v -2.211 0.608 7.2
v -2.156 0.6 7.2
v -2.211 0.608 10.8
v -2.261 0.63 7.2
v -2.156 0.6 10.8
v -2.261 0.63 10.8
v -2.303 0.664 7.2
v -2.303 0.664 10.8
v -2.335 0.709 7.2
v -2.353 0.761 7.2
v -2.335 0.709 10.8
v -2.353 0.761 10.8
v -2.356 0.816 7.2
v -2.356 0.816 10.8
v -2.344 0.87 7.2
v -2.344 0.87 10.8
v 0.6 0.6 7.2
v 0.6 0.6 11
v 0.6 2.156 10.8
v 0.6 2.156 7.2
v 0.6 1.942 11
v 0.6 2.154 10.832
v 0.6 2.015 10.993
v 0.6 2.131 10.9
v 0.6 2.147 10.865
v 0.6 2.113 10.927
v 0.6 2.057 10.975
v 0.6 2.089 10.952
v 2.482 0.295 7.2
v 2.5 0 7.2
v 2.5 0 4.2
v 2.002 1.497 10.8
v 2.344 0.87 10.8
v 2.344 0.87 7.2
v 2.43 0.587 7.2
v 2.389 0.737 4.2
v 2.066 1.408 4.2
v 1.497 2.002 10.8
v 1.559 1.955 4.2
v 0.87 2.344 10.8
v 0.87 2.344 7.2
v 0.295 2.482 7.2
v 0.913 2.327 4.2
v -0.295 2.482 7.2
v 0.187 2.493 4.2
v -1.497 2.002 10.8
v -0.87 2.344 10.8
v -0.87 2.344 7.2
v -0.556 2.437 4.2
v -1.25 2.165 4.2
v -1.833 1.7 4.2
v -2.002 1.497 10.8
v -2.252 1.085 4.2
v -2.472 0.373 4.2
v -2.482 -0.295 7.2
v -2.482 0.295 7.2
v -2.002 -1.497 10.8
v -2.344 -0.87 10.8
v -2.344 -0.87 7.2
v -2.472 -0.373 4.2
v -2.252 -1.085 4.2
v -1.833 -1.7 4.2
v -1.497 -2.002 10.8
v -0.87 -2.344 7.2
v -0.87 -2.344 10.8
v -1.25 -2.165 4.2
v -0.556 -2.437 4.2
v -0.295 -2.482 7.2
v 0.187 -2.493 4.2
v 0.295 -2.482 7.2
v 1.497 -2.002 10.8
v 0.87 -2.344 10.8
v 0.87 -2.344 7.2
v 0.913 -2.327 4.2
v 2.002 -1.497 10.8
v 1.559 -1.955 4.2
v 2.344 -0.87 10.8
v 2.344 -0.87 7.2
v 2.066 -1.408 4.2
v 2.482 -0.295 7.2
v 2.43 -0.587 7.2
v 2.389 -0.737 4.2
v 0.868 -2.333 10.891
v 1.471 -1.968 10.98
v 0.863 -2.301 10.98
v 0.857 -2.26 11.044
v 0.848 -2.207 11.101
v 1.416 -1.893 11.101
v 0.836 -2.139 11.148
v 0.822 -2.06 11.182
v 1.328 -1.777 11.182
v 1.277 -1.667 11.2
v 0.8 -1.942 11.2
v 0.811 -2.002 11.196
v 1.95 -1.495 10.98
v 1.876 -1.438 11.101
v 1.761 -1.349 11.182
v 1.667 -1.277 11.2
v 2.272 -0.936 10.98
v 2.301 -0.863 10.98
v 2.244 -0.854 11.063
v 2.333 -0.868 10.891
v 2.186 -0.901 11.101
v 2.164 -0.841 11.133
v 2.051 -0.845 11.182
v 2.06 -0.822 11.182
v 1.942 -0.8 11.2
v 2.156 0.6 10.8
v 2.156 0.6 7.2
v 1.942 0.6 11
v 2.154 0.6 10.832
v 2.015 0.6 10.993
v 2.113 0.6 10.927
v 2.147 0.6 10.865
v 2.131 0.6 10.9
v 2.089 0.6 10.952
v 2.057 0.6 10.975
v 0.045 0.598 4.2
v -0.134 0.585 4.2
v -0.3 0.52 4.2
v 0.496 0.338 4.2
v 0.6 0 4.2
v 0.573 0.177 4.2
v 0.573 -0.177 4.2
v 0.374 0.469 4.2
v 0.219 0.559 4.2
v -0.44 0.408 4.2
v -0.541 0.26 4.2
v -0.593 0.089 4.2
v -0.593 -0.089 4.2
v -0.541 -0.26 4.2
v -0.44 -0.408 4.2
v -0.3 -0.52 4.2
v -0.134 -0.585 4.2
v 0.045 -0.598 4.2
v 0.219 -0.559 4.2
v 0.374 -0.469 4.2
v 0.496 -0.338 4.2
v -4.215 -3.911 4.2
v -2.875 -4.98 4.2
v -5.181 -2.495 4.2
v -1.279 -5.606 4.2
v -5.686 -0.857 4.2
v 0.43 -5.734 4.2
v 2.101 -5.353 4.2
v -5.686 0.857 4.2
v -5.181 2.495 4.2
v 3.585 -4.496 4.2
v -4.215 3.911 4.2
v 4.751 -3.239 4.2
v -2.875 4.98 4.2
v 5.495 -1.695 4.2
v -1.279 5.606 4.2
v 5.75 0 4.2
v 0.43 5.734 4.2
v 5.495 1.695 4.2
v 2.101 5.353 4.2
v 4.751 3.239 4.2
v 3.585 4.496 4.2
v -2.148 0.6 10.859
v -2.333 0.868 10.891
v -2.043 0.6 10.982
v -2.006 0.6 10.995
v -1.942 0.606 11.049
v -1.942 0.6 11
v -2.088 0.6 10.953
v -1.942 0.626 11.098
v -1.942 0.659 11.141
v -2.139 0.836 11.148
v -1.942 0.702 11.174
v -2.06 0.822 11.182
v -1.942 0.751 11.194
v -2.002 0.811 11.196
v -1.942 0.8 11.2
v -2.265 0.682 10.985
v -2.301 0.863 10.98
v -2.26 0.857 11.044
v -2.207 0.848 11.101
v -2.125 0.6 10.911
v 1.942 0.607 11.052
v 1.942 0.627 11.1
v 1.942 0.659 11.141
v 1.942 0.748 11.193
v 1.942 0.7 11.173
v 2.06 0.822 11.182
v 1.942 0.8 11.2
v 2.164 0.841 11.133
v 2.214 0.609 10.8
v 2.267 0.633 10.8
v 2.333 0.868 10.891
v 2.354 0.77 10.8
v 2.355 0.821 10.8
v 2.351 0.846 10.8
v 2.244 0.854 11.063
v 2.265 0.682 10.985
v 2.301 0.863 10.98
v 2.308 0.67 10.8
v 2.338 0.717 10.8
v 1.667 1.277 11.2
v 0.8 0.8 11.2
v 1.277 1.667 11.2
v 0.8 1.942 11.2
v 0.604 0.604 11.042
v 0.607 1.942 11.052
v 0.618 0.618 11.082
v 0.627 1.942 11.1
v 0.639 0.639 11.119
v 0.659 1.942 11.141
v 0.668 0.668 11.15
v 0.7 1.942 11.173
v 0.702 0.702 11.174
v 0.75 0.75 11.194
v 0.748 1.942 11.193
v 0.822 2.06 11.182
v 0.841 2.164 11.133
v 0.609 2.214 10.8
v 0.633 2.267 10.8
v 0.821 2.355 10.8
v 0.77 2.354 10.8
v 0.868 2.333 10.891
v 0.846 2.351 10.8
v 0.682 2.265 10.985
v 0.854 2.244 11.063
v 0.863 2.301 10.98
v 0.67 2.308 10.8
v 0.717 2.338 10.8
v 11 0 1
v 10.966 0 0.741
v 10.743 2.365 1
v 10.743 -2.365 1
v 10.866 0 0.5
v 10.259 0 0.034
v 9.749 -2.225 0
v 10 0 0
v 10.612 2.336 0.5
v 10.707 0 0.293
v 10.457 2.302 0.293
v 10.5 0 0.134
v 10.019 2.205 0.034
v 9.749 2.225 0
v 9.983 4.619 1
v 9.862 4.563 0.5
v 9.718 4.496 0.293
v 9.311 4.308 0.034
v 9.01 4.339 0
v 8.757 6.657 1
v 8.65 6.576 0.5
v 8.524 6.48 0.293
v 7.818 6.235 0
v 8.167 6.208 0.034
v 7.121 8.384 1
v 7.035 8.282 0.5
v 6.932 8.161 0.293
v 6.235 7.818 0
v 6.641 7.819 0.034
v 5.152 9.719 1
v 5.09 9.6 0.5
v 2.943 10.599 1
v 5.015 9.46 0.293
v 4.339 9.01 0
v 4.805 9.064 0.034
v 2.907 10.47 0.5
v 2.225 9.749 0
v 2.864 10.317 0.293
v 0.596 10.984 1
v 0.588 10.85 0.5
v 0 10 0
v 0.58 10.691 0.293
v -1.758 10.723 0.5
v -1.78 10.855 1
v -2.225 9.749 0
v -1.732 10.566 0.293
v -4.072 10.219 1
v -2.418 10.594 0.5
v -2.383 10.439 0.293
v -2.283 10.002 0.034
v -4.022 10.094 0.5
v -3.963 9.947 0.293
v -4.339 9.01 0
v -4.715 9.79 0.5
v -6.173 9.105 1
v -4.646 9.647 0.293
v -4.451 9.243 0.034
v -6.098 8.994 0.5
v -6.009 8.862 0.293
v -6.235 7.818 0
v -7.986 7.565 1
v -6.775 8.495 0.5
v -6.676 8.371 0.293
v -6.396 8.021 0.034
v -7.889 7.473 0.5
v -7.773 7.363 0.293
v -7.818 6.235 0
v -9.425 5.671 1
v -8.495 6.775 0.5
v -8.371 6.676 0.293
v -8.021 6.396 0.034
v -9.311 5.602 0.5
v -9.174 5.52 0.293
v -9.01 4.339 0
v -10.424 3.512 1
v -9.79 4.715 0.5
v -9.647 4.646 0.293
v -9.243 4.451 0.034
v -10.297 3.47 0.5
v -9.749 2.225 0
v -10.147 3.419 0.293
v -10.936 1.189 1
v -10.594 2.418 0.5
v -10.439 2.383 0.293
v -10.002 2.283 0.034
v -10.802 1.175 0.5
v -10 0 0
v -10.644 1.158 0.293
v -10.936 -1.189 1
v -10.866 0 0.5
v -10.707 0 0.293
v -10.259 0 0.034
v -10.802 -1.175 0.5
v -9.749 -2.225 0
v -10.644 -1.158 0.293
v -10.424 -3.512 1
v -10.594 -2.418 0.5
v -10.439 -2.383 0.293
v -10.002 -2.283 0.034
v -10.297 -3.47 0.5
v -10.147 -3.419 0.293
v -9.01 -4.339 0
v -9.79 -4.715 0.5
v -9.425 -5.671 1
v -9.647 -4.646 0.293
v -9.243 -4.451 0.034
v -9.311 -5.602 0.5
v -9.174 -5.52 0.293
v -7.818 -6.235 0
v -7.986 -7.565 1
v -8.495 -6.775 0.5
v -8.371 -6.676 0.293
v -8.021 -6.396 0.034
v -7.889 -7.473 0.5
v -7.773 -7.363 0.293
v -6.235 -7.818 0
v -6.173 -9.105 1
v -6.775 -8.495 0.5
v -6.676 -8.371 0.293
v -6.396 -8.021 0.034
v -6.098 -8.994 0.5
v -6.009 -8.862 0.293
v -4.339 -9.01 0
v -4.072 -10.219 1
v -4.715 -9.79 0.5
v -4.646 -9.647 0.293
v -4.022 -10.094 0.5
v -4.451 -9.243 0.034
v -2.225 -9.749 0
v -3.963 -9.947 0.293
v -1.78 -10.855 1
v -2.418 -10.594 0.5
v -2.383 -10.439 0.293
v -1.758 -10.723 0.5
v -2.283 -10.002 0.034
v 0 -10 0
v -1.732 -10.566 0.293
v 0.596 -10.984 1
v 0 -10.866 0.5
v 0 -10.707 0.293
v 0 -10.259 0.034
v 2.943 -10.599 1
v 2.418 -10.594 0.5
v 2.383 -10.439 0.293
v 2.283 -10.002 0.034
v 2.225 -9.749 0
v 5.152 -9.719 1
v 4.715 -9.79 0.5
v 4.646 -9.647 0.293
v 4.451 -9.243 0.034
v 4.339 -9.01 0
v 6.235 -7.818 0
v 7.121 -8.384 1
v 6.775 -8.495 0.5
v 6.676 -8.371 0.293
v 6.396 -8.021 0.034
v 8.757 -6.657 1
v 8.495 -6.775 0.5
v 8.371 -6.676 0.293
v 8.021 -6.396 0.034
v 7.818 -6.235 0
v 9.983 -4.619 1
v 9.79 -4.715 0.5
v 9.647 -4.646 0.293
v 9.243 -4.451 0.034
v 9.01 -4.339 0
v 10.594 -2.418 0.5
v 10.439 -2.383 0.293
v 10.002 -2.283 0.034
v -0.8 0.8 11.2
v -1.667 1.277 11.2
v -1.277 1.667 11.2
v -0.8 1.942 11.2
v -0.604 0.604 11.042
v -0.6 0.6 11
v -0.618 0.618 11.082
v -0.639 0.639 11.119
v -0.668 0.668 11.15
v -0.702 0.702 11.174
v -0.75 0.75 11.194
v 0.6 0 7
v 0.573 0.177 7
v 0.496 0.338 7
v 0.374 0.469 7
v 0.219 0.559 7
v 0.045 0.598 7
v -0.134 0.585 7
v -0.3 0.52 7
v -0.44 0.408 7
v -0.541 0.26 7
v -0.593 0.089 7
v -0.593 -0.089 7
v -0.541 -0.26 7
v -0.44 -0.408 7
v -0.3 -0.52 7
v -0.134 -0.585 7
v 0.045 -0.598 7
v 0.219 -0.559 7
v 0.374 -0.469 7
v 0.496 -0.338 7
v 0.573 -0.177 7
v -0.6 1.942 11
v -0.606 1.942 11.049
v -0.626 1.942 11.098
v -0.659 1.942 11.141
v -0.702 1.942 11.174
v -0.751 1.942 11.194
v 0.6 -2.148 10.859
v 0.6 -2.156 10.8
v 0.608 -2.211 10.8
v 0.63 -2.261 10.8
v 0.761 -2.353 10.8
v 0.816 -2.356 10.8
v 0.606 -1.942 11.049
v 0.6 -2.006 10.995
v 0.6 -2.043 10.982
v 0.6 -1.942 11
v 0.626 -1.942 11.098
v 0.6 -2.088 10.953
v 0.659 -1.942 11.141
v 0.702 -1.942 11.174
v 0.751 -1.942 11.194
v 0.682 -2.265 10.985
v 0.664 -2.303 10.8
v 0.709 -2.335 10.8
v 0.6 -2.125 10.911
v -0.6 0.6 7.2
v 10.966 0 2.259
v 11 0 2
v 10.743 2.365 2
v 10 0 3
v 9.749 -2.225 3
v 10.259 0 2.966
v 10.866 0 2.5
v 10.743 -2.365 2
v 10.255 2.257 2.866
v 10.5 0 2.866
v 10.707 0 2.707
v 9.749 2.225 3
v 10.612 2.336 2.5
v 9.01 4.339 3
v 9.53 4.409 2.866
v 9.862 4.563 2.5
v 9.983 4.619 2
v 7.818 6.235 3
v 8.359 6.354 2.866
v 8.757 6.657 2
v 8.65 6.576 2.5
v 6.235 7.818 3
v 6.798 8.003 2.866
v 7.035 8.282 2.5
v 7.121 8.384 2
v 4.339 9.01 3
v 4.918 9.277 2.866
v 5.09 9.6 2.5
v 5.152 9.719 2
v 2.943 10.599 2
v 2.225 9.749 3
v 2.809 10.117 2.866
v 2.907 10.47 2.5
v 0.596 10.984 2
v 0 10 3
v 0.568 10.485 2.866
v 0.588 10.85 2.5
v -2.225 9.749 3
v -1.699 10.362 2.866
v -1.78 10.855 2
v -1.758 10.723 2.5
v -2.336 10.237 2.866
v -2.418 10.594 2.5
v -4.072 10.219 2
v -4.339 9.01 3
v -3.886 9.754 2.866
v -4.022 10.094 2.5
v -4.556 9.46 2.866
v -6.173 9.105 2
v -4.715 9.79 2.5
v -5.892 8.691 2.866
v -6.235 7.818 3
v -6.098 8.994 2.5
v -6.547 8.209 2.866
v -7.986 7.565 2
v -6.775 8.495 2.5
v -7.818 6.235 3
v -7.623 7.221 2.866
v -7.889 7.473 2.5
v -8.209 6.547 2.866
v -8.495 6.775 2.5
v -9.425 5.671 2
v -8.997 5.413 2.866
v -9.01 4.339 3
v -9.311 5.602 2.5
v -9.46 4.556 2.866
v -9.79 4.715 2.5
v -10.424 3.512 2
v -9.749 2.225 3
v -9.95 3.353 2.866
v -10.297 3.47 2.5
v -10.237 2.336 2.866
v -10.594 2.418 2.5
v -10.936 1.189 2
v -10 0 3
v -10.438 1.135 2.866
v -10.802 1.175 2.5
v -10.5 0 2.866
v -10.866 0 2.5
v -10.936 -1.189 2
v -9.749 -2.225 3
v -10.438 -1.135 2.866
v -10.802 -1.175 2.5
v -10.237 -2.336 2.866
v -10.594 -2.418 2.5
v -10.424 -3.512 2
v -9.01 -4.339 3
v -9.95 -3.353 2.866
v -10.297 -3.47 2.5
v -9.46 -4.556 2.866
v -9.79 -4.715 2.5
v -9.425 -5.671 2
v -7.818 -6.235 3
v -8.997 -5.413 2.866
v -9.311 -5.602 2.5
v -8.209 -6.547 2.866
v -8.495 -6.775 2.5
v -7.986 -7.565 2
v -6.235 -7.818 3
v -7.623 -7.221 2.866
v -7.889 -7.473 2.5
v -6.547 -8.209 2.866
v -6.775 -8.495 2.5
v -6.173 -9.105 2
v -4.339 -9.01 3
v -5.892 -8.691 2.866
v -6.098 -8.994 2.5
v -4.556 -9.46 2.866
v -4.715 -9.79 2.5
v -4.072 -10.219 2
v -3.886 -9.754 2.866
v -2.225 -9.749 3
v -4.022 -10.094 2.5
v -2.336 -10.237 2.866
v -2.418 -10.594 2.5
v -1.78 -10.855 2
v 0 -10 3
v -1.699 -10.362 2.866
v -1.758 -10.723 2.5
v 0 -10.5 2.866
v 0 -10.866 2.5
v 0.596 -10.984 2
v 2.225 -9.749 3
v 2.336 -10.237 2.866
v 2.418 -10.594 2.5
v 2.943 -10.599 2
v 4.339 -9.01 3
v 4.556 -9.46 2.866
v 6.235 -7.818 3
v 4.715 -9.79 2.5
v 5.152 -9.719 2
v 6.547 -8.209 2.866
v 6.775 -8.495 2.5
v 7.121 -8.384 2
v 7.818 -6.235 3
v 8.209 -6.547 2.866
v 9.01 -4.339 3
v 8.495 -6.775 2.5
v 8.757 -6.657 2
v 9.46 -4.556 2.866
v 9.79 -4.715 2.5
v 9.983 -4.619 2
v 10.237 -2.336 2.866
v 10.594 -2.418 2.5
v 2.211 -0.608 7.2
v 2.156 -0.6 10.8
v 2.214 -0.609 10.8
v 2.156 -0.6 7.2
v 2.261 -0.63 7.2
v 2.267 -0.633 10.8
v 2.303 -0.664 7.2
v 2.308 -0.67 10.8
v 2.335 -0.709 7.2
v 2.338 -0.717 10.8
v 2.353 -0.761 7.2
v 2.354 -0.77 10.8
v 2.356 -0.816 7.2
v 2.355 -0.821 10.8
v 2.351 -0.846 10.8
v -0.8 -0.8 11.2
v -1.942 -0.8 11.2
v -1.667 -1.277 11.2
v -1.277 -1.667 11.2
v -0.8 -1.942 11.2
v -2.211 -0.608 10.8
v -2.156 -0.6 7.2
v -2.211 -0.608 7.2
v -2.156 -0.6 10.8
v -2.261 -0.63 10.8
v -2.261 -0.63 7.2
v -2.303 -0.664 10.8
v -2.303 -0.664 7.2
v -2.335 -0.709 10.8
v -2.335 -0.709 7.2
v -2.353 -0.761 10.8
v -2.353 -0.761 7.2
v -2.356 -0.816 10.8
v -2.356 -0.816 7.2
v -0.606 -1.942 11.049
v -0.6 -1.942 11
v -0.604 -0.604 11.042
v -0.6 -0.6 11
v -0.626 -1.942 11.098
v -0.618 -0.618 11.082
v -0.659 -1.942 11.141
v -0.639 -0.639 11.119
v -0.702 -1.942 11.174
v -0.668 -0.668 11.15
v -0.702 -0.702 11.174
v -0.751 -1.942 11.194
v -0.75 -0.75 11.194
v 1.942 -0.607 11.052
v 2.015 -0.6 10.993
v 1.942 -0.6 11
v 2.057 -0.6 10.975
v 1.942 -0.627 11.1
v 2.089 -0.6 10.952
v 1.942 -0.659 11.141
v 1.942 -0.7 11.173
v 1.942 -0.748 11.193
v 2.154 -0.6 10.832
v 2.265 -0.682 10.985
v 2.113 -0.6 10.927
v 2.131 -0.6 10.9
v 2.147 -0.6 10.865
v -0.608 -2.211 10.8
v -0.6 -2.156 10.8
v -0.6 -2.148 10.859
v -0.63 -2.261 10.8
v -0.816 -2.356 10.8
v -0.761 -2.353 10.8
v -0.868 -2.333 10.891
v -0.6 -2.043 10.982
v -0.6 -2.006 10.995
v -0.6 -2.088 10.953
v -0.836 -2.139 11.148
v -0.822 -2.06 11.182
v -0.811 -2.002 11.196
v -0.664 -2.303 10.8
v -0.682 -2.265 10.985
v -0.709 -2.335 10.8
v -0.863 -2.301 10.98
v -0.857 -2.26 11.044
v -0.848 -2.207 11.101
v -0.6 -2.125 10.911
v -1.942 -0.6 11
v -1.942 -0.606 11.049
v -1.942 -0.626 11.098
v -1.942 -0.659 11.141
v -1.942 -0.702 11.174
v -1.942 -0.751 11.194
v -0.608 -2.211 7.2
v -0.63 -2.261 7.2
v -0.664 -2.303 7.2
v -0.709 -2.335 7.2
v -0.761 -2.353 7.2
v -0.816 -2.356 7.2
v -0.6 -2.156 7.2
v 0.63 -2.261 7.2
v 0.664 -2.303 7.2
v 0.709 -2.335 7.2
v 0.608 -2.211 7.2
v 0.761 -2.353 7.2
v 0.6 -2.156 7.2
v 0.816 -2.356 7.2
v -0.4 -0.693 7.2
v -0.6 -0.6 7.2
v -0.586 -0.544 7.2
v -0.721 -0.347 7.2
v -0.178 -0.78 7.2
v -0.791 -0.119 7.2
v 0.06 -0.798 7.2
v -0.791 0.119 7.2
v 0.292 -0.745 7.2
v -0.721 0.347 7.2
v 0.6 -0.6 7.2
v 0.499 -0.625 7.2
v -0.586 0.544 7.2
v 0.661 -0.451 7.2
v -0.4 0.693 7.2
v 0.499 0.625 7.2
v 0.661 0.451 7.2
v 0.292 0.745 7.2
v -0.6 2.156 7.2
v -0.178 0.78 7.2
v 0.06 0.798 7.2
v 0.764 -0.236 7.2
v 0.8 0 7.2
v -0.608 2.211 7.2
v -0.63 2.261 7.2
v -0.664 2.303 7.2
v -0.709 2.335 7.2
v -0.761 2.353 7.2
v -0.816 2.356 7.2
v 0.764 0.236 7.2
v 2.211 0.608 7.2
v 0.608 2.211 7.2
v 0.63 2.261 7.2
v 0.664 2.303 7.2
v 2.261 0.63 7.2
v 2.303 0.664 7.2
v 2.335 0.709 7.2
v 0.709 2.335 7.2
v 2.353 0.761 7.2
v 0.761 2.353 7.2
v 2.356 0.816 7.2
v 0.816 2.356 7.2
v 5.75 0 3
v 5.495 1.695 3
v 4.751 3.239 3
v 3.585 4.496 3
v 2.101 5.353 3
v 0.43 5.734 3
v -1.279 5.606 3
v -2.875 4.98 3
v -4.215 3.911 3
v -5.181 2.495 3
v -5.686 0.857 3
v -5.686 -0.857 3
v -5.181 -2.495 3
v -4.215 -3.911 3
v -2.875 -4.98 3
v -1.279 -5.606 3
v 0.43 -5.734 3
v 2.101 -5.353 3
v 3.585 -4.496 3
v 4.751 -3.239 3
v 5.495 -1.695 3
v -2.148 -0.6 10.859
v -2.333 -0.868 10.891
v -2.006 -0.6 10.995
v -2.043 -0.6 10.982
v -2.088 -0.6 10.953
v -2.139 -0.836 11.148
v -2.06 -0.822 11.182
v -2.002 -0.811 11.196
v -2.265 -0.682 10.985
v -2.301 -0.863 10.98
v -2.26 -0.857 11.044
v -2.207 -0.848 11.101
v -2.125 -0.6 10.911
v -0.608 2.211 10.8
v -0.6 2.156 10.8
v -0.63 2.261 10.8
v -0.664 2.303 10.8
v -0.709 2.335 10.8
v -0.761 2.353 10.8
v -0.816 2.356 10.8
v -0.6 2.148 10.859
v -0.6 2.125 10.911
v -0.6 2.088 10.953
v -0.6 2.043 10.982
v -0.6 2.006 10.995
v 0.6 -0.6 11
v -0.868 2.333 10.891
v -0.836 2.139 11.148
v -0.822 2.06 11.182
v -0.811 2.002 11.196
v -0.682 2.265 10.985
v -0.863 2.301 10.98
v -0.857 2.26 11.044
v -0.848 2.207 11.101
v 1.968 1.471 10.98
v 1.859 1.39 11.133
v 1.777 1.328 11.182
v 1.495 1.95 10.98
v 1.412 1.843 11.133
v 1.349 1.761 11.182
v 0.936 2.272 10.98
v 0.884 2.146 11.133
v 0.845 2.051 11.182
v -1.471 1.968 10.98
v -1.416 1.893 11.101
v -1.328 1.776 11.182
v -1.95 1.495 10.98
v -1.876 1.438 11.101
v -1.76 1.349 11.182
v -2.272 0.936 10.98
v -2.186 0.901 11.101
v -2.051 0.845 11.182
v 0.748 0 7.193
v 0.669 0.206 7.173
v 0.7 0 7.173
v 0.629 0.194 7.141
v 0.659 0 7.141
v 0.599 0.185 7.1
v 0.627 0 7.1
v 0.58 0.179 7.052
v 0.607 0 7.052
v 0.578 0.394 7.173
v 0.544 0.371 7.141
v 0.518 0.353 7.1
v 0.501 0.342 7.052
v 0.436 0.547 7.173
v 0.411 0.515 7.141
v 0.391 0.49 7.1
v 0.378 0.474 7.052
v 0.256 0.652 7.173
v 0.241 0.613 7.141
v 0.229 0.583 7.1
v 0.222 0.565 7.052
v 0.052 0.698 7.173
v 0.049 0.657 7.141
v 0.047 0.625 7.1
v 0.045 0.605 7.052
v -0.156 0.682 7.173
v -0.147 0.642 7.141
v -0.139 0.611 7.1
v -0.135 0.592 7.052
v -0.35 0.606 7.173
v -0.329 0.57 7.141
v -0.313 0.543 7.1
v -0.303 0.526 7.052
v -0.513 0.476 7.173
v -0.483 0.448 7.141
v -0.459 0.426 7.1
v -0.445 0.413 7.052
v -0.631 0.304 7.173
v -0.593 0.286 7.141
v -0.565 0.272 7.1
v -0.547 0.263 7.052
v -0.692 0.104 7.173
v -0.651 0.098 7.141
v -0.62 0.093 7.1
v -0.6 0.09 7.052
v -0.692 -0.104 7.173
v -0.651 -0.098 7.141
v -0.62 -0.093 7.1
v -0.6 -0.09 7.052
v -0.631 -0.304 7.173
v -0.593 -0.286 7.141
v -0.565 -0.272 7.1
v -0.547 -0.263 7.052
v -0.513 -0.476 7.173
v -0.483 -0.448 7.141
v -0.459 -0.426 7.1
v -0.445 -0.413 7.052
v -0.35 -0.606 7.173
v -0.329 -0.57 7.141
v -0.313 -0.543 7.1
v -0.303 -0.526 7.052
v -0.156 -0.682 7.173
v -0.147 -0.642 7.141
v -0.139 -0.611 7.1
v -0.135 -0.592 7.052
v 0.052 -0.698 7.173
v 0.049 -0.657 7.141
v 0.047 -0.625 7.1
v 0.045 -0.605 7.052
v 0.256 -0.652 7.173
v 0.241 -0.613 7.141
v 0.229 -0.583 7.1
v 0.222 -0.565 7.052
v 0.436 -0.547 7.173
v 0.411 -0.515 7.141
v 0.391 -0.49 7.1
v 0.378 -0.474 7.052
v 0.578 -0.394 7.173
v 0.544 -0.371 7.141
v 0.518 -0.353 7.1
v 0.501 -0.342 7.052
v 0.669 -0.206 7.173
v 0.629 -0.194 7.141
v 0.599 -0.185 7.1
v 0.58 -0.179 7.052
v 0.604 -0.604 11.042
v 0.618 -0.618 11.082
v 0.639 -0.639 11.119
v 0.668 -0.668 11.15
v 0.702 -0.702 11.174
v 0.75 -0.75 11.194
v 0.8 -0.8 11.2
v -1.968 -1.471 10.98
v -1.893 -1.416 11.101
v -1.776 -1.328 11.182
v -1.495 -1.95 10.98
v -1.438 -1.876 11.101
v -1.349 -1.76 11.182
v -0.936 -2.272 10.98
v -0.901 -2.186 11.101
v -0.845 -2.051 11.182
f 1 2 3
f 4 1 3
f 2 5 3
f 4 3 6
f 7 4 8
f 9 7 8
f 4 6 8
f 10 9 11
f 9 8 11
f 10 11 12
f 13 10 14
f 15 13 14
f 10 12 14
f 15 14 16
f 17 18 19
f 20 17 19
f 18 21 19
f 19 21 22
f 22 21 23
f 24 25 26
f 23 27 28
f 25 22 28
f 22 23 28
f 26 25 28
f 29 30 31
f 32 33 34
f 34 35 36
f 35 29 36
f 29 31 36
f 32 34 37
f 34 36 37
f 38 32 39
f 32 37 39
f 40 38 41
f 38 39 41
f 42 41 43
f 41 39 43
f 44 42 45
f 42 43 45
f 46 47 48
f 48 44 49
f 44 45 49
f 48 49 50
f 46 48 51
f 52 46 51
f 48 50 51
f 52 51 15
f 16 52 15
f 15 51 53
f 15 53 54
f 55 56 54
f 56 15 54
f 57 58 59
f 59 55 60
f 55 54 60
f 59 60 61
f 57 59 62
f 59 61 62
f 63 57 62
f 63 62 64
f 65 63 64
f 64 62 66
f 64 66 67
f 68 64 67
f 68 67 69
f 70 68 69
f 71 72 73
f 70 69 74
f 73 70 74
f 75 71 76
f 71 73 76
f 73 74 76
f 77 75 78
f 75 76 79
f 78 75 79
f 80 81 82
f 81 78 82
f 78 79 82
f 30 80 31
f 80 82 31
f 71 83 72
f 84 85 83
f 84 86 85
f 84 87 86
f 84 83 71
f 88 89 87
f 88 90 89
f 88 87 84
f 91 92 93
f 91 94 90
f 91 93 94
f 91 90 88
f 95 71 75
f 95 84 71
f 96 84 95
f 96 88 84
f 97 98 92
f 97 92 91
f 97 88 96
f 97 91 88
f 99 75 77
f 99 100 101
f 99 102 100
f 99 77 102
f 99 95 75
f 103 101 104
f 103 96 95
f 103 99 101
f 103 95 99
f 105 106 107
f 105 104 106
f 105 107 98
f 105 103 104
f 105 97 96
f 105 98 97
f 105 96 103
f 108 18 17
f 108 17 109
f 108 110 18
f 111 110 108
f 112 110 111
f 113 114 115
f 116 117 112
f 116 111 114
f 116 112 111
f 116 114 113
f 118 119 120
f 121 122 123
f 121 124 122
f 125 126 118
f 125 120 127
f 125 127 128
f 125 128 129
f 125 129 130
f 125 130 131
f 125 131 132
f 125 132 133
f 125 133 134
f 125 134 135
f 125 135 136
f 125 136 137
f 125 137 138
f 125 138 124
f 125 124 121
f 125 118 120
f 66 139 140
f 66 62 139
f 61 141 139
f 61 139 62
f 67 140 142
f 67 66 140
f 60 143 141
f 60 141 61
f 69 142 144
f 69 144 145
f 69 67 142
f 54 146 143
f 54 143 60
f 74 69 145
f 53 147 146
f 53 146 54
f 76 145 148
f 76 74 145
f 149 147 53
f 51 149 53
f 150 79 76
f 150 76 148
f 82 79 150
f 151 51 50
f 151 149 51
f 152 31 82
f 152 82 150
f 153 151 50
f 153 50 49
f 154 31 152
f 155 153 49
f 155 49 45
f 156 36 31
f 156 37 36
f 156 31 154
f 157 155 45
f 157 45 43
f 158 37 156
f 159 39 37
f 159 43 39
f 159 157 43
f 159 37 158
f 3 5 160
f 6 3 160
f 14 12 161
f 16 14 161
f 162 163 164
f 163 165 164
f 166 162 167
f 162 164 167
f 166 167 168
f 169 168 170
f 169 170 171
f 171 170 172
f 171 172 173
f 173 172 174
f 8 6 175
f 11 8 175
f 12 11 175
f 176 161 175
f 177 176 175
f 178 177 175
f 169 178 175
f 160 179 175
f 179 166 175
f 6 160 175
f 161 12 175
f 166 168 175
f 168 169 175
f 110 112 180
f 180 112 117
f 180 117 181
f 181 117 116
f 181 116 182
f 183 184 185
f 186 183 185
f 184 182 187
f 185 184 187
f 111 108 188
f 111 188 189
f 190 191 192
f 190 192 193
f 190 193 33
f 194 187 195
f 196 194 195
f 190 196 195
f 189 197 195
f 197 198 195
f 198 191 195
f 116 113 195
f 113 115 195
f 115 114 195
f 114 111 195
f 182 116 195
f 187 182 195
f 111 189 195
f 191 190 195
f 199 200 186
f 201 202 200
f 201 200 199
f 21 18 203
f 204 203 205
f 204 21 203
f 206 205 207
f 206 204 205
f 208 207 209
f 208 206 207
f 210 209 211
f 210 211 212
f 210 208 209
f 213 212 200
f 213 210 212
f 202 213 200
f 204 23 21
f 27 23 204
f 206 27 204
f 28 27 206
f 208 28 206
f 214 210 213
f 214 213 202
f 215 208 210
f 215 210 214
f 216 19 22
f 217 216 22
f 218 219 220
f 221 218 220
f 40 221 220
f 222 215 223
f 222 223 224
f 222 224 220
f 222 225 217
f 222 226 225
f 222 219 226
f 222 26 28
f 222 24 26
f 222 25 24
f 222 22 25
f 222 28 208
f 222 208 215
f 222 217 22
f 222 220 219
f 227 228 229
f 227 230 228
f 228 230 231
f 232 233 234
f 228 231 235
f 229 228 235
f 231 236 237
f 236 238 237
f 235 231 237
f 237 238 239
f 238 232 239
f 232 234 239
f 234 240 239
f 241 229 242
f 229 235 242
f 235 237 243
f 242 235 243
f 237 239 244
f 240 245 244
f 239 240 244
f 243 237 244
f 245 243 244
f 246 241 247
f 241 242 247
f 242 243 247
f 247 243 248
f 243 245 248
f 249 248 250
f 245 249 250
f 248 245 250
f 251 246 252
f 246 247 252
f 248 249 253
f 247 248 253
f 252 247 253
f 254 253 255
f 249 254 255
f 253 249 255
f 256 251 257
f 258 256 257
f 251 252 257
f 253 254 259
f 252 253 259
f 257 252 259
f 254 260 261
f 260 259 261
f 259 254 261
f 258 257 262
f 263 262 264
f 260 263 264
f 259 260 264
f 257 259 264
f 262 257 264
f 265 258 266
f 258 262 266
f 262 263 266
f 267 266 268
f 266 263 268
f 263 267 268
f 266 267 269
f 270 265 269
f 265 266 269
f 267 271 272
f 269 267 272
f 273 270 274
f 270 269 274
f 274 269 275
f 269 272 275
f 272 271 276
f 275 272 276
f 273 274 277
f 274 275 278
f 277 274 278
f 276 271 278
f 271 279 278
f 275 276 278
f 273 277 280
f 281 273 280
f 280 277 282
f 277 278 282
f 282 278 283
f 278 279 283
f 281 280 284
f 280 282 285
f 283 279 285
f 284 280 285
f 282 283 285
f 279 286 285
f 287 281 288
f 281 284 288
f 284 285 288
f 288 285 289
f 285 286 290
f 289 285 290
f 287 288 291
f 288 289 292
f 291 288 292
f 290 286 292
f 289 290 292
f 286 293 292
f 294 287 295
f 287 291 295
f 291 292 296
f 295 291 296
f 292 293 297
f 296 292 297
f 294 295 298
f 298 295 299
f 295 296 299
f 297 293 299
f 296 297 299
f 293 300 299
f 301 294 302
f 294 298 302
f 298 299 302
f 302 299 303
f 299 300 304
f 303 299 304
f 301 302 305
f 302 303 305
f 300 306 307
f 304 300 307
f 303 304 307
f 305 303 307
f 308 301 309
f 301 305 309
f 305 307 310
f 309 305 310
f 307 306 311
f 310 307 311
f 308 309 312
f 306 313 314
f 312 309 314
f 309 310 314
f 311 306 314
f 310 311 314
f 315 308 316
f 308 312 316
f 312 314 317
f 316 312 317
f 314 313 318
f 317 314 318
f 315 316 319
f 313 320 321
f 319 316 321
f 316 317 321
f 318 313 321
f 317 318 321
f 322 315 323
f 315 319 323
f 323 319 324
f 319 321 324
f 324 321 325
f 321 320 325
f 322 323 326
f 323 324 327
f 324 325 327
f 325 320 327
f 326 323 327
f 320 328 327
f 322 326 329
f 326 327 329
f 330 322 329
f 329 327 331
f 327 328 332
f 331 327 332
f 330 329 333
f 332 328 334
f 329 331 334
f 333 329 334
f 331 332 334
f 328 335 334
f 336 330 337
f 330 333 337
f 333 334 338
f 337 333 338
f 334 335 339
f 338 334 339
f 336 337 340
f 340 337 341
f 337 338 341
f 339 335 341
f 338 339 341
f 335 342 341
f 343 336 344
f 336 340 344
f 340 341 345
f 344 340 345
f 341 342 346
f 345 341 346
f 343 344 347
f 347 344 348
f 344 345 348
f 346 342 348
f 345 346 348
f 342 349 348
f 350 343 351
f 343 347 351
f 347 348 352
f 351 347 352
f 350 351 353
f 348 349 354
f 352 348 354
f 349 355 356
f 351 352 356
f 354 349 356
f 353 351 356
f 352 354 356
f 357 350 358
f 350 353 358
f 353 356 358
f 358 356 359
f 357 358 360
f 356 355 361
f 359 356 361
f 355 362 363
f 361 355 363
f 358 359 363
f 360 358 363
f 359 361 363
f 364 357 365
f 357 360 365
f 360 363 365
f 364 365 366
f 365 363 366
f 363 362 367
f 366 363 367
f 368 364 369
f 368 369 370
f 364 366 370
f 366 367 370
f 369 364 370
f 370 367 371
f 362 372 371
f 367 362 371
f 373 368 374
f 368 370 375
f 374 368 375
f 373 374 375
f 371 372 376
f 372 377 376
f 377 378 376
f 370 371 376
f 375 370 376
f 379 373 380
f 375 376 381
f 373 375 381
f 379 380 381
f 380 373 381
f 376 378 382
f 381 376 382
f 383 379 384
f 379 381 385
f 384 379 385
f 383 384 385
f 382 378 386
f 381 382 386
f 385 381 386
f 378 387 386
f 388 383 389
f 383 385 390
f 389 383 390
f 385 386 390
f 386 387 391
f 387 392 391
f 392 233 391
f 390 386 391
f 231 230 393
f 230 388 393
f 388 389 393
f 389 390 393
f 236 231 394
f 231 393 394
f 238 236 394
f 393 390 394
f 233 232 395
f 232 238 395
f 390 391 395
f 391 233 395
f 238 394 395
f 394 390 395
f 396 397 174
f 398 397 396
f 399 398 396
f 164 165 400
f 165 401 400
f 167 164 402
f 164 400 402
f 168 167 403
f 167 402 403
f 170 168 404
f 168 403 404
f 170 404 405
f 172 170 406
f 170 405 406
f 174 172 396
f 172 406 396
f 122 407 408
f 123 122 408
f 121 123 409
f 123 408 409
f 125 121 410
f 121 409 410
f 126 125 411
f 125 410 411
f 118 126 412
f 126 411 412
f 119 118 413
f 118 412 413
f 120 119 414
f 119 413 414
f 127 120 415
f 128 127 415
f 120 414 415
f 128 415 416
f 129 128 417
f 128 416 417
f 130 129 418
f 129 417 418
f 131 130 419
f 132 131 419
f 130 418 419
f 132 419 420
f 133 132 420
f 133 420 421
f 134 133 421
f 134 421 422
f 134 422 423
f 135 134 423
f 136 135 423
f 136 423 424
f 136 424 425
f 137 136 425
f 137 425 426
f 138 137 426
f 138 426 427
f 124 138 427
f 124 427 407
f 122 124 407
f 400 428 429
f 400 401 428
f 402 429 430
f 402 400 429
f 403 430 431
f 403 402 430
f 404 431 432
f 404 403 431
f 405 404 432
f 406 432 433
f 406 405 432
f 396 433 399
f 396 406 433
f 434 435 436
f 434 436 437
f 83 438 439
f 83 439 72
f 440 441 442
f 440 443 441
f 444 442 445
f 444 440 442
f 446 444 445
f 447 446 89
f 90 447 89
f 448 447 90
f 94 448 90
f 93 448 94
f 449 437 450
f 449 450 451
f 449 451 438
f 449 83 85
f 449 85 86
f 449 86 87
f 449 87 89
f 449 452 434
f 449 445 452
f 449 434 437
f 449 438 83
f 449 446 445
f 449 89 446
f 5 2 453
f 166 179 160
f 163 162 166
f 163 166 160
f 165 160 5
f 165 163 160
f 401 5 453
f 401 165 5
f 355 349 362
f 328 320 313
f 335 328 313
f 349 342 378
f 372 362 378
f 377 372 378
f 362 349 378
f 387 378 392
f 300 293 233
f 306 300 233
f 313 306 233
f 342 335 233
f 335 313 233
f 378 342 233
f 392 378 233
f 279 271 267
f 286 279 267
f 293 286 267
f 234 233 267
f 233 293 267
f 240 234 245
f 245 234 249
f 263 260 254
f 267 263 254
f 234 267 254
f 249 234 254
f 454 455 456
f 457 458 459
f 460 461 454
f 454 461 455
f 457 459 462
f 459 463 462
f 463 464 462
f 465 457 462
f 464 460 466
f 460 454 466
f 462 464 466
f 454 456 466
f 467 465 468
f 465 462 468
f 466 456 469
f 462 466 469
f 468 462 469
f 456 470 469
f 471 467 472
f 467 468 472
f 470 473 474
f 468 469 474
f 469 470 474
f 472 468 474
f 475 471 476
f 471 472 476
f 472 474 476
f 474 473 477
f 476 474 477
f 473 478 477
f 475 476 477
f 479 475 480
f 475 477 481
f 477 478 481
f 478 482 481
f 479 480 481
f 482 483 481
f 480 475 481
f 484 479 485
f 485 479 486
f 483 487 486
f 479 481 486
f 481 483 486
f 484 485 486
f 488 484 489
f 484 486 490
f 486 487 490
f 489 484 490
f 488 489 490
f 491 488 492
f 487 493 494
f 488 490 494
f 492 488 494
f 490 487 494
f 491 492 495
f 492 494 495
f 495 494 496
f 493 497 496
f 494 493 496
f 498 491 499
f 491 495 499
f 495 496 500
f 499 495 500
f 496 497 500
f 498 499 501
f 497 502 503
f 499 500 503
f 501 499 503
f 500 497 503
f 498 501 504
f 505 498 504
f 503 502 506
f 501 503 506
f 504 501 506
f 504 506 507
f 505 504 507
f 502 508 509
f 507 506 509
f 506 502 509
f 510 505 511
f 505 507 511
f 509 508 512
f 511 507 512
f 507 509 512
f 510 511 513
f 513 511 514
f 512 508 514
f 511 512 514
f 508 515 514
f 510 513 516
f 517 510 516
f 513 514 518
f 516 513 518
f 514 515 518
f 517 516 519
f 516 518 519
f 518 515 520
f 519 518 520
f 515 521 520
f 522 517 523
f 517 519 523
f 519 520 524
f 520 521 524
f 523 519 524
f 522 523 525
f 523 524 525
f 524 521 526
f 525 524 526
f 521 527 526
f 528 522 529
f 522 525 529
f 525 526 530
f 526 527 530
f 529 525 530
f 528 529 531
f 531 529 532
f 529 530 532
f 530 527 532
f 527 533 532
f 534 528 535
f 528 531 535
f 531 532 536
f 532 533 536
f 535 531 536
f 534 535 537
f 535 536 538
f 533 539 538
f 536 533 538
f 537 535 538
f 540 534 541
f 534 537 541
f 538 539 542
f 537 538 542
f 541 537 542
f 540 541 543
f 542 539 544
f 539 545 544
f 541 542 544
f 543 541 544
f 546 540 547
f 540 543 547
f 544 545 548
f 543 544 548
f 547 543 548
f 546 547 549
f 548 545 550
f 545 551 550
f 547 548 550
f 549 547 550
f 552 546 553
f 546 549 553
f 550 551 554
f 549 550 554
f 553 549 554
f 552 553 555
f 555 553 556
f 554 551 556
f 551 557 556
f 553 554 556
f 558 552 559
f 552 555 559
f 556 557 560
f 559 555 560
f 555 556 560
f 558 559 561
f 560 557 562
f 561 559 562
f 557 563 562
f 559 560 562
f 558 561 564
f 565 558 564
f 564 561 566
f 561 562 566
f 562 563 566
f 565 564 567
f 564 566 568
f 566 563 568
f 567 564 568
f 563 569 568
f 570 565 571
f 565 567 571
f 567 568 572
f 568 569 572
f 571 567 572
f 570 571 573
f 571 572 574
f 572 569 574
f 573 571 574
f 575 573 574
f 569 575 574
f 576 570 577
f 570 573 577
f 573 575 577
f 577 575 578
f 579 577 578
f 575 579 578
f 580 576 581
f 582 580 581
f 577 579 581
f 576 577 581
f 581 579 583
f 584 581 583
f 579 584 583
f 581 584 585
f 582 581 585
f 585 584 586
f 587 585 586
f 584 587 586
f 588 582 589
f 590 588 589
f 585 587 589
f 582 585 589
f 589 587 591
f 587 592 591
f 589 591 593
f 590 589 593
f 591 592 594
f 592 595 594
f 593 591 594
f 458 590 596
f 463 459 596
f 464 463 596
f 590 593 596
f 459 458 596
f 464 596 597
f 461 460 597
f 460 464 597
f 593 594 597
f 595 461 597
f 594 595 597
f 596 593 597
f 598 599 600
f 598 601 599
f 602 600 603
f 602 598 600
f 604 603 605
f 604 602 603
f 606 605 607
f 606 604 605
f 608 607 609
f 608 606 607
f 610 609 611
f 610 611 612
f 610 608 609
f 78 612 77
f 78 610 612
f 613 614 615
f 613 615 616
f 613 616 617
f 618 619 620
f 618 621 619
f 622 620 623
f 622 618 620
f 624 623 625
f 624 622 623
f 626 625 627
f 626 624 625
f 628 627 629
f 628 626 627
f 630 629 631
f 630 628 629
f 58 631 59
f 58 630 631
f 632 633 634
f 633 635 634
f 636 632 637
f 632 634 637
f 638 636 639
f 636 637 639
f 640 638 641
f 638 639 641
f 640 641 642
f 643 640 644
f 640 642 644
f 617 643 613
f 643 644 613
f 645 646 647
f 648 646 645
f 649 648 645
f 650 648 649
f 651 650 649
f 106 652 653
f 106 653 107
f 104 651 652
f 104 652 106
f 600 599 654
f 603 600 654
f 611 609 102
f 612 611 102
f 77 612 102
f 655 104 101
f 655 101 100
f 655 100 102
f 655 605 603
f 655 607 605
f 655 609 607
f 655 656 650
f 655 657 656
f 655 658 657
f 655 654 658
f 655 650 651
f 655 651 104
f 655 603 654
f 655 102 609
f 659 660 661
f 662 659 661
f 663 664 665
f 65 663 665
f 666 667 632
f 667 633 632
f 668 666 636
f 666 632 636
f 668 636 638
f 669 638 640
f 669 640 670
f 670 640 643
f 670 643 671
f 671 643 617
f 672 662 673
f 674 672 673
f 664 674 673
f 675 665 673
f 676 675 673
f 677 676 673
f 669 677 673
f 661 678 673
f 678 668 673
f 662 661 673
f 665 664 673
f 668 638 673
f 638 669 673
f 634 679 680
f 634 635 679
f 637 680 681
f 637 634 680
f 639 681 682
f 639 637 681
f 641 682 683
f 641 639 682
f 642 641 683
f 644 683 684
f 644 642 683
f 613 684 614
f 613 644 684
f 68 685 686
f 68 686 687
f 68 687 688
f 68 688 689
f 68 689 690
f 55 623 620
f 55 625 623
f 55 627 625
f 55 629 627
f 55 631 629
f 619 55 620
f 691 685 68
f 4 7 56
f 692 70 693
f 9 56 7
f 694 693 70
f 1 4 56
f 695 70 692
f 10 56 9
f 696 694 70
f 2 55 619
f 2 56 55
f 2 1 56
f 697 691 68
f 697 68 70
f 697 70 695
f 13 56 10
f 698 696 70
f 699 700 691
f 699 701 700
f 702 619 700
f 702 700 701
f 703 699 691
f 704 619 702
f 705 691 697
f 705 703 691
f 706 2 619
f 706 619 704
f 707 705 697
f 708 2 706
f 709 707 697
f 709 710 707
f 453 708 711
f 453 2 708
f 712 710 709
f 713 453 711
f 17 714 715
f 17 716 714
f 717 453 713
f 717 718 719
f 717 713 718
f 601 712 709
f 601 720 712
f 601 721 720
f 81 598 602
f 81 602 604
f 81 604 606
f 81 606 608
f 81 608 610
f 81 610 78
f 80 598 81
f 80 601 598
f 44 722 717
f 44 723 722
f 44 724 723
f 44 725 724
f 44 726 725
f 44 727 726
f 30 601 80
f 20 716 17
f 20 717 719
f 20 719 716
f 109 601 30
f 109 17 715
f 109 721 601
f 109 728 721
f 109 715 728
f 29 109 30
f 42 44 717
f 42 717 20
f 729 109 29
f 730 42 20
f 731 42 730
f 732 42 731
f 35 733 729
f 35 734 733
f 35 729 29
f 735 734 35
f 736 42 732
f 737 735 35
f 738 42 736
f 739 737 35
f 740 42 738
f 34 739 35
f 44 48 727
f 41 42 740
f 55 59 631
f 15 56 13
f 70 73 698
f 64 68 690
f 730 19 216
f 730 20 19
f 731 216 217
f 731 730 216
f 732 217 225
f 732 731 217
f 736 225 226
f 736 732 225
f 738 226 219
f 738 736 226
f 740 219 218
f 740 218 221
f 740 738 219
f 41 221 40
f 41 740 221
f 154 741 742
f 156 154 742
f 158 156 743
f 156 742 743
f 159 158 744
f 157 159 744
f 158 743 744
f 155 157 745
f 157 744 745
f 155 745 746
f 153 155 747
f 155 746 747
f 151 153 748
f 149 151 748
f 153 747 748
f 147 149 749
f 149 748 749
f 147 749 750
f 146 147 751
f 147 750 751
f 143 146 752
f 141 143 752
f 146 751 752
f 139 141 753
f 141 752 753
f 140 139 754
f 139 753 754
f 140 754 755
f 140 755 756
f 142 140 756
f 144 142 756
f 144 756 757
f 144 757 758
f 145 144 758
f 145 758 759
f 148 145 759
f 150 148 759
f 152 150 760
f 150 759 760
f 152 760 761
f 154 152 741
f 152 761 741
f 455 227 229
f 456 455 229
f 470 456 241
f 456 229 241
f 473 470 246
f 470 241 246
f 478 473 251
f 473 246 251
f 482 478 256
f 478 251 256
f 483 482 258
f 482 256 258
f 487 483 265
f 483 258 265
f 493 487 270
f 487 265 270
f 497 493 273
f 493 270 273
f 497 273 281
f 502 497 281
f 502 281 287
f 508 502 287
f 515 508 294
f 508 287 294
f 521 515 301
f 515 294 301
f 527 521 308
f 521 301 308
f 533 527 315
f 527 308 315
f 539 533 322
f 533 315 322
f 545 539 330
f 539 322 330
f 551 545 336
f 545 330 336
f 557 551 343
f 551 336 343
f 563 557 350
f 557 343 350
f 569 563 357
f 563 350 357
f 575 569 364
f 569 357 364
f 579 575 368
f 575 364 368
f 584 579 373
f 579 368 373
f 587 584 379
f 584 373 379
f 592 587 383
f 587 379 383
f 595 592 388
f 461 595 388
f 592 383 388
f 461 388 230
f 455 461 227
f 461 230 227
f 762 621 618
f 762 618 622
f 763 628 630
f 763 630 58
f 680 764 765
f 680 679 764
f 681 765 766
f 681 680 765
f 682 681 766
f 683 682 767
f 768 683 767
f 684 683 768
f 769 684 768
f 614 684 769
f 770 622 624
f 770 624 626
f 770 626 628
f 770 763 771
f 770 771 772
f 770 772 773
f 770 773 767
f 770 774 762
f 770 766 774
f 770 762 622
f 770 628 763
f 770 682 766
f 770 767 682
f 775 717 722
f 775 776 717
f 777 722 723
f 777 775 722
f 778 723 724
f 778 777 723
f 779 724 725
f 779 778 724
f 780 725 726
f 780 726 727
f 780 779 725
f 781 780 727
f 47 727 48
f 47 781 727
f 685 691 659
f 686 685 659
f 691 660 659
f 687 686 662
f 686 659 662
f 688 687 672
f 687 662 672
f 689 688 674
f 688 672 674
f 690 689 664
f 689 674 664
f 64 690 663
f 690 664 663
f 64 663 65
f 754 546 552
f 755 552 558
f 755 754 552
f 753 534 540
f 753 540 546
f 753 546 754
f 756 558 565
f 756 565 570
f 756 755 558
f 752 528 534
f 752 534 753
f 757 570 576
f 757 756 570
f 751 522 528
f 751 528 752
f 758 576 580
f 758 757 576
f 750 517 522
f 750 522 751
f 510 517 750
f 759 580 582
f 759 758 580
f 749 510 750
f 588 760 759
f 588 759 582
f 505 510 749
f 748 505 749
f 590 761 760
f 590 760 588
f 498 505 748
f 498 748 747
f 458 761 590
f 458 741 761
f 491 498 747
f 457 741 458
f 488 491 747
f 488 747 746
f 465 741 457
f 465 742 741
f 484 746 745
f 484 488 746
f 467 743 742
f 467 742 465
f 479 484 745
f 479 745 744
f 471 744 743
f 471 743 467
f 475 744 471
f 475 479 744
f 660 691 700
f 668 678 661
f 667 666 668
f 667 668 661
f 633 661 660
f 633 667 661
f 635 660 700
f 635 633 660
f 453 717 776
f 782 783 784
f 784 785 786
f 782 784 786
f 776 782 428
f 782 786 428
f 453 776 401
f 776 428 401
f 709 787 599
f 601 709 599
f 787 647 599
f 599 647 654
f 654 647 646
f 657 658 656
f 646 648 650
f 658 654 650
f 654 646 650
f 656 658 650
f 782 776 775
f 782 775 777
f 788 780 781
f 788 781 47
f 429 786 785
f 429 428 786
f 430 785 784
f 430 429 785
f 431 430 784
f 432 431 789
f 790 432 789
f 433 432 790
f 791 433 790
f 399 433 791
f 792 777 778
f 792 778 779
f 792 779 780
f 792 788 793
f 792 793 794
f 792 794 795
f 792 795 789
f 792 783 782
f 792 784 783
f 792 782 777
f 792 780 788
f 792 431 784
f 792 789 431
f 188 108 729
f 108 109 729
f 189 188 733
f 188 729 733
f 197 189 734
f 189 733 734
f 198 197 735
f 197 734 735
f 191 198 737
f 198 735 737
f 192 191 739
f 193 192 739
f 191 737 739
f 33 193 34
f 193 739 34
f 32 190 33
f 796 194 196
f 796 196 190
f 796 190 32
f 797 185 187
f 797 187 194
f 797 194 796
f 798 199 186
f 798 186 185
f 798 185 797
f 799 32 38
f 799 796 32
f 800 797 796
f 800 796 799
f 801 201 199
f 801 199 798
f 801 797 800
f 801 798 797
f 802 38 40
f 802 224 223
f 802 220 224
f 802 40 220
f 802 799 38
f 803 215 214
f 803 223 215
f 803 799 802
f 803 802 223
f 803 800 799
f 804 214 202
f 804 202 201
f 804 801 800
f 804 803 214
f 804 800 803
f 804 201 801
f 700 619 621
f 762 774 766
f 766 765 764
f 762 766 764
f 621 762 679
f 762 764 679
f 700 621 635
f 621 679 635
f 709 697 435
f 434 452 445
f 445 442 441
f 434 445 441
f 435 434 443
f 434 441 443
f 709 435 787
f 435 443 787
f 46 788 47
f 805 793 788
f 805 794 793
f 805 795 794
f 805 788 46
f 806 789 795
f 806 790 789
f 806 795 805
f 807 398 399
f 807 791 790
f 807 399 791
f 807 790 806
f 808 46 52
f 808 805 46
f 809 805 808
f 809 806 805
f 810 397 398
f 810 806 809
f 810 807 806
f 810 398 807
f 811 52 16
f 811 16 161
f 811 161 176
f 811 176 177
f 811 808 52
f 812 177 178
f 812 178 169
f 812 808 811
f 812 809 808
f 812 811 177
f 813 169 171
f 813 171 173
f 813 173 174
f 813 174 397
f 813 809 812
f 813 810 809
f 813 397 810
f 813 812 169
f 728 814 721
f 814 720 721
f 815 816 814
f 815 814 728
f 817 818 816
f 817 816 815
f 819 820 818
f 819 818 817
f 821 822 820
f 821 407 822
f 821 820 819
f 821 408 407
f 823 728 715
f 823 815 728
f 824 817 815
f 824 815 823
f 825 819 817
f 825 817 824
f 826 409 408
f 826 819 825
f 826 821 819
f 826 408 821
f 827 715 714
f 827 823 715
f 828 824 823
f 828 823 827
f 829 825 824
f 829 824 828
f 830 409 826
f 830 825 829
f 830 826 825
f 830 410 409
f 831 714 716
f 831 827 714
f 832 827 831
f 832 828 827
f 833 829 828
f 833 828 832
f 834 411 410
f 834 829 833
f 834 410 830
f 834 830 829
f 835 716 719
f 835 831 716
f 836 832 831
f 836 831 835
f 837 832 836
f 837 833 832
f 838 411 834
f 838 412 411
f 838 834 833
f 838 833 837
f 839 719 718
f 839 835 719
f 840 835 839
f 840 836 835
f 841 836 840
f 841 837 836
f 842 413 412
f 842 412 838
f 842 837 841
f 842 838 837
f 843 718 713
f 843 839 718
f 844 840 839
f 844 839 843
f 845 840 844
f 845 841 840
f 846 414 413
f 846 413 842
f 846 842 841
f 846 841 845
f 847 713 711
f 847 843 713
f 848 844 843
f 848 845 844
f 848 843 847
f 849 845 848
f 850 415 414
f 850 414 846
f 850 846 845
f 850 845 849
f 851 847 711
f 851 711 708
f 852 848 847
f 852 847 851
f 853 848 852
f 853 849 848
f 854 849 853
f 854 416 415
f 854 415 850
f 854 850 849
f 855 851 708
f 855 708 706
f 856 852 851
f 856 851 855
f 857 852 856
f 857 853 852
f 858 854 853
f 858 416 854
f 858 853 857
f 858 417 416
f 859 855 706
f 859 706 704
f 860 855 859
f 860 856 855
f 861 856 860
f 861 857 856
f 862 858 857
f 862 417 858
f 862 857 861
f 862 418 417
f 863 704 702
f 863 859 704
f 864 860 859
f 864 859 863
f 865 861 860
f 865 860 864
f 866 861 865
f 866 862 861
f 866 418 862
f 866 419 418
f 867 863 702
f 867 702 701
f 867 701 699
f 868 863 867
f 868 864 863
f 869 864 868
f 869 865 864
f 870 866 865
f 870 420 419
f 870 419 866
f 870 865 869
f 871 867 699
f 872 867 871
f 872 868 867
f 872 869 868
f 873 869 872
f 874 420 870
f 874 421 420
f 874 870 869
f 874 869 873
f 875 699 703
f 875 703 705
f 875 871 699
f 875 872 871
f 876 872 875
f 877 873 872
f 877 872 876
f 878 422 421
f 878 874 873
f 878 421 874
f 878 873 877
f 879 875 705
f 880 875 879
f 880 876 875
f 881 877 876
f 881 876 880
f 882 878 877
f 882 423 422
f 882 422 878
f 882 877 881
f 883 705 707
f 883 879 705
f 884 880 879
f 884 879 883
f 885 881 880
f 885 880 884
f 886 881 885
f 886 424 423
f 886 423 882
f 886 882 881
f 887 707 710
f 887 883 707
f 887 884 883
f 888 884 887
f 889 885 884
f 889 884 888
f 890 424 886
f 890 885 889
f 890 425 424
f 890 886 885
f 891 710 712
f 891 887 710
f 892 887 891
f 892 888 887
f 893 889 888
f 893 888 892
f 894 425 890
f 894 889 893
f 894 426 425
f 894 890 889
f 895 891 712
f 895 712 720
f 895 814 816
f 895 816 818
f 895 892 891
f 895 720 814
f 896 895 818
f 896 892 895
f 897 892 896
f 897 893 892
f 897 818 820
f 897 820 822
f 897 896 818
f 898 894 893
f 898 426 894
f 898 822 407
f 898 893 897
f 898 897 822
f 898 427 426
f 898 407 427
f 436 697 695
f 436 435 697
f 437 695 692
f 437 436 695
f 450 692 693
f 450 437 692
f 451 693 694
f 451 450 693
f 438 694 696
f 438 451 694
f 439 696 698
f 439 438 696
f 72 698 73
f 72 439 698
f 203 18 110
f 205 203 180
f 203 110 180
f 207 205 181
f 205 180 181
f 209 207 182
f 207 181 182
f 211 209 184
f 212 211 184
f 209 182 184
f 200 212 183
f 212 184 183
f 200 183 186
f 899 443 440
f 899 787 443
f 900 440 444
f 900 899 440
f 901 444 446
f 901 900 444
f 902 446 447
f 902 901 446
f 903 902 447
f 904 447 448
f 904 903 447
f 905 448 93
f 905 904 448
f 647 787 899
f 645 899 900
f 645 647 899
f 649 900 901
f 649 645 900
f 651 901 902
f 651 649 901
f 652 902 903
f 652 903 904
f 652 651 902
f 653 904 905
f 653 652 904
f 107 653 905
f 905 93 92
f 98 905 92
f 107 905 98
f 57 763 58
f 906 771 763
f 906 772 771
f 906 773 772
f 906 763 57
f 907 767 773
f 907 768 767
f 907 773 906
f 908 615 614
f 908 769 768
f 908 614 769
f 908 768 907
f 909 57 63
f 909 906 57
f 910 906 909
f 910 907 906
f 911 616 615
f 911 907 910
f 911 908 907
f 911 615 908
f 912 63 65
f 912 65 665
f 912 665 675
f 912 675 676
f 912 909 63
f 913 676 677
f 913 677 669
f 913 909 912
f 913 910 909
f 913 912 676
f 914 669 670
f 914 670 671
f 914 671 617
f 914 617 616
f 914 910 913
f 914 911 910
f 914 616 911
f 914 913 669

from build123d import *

# Parameters (mm, degrees)
F0_R      = 11
F1_DEPTH  = 3
F2_R      = 5.75
F3_DEPTH  = 1.2
F4_R      = 2.5
F5_DEPTH  = 7
F6_R      = 0.6
F10_DEPTH = 7
F11_W     = 1.2
F11_H     = 2.8315826069
F11_H_2   = 1.2
F11_W_2   = 2.9928033758
F12_DEPTH = 4
F13_R     = 0.4
F14_R     = 1
F15_R     = 0.2


# Not quite as in the source:
# - a feature of the source that left no trace in its solid (it failed there, or was rolled back) is left out


with BuildPart() as f1:
    # F0 (on Top) → F1 (new body)
    with BuildSketch(Plane.XY):
        Circle(F0_R)
    extrude(amount=F1_DEPTH)

    # F2 (on face) → F3 (join)
    with BuildSketch(Plane.XY.offset(3)):
        Circle(F2_R)
    extrude(amount=F3_DEPTH)

    # F4 (on face) → F5 (join)
    with BuildSketch(Plane.XY.offset(4.2)):
        Circle(F4_R)
    extrude(amount=F5_DEPTH)

    # F6 (on face) → F10 (cut)
    with BuildSketch(Plane.XY.offset(11.2)):
        Circle(F6_R)
    extrude(amount=-F10_DEPTH, mode=Mode.SUBTRACT)

    # F11 (on face) → F12 (cut)
    with BuildSketch(Plane.XY.offset(11.2)):
        with Locations((0, 2.0157913034)):
            Rectangle(F11_W, F11_H)
        Rectangle(F11_W, F11_H_2)
        with Locations((-2.0964016879, 0)):
            Rectangle(F11_W_2, F11_H_2)
        with Locations((2.0964016879, 0)):
            Rectangle(F11_W_2, F11_H_2)
        with Locations((0, -2.0157913034)):
            Rectangle(F11_W, F11_H)
    extrude(amount=-F12_DEPTH, mode=Mode.SUBTRACT)

    # F13
    f13_edges = [f1.edges().sort_by_distance(p)[0] for p in [
        (1.767767, -1.767767, 11.2),
        (-1.767767, -1.767767, 11.2),
        (-1.767767, 1.767767, 11.2),
        (1.767767, 1.767767, 11.2),
    ]]
    fillet(f13_edges, radius=F13_R)

    # F14
    f14_edges = [f1.edges().sort_by_distance(p)[0] for p in [
        (-11, 0, 3),
        (-11, 0, 0),
    ]]
    fillet(f14_edges, radius=F14_R)

    # F15
    f15_edges = [f1.edges().sort_by_distance(p)[0] for p in [
        (-0.6, 1.306231, 11.2),
        (-1.484924, 1.484924, 11.2),
        (-1.306231, 0.6, 11.2),
        (1.306231, 0.6, 11.2),
        (1.484924, 1.484924, 11.2),
        (0.6, 1.306231, 11.2),
        (0.6, -1.306231, 11.2),
        (1.484924, -1.484924, 11.2),
        (1.306231, -0.6, 11.2),
        (-1.306231, -0.6, 11.2),
        (-1.484924, -1.484924, 11.2),
        (-0.6, -1.306231, 11.2),
        (-0.6, 0, 7.2),
        (2.426932, -0.6, 9),
        (0.6, -2.426932, 9),
        (-0.6, -2.426932, 9),
        (-2.426932, -0.6, 9),
        (2.426932, 0.6, 9),
        (-2.426932, 0.6, 9),
        (0.6, 2.426932, 9),
        (-0.6, 2.426932, 9),
        (2.305572, -0.6, 11.08332),
        (0.6, -2.305572, 11.08332),
        (-0.6, -2.305572, 11.08332),
        (-2.305572, -0.6, 11.08332),
        (2.305572, 0.6, 11.08332),
        (0.6, 2.305572, 11.08332),
        (-2.305572, 0.6, 11.08332),
        (-0.6, 2.305572, 11.08332),
    ]]
    fillet(f15_edges, radius=F15_R)


solid = f1.part
